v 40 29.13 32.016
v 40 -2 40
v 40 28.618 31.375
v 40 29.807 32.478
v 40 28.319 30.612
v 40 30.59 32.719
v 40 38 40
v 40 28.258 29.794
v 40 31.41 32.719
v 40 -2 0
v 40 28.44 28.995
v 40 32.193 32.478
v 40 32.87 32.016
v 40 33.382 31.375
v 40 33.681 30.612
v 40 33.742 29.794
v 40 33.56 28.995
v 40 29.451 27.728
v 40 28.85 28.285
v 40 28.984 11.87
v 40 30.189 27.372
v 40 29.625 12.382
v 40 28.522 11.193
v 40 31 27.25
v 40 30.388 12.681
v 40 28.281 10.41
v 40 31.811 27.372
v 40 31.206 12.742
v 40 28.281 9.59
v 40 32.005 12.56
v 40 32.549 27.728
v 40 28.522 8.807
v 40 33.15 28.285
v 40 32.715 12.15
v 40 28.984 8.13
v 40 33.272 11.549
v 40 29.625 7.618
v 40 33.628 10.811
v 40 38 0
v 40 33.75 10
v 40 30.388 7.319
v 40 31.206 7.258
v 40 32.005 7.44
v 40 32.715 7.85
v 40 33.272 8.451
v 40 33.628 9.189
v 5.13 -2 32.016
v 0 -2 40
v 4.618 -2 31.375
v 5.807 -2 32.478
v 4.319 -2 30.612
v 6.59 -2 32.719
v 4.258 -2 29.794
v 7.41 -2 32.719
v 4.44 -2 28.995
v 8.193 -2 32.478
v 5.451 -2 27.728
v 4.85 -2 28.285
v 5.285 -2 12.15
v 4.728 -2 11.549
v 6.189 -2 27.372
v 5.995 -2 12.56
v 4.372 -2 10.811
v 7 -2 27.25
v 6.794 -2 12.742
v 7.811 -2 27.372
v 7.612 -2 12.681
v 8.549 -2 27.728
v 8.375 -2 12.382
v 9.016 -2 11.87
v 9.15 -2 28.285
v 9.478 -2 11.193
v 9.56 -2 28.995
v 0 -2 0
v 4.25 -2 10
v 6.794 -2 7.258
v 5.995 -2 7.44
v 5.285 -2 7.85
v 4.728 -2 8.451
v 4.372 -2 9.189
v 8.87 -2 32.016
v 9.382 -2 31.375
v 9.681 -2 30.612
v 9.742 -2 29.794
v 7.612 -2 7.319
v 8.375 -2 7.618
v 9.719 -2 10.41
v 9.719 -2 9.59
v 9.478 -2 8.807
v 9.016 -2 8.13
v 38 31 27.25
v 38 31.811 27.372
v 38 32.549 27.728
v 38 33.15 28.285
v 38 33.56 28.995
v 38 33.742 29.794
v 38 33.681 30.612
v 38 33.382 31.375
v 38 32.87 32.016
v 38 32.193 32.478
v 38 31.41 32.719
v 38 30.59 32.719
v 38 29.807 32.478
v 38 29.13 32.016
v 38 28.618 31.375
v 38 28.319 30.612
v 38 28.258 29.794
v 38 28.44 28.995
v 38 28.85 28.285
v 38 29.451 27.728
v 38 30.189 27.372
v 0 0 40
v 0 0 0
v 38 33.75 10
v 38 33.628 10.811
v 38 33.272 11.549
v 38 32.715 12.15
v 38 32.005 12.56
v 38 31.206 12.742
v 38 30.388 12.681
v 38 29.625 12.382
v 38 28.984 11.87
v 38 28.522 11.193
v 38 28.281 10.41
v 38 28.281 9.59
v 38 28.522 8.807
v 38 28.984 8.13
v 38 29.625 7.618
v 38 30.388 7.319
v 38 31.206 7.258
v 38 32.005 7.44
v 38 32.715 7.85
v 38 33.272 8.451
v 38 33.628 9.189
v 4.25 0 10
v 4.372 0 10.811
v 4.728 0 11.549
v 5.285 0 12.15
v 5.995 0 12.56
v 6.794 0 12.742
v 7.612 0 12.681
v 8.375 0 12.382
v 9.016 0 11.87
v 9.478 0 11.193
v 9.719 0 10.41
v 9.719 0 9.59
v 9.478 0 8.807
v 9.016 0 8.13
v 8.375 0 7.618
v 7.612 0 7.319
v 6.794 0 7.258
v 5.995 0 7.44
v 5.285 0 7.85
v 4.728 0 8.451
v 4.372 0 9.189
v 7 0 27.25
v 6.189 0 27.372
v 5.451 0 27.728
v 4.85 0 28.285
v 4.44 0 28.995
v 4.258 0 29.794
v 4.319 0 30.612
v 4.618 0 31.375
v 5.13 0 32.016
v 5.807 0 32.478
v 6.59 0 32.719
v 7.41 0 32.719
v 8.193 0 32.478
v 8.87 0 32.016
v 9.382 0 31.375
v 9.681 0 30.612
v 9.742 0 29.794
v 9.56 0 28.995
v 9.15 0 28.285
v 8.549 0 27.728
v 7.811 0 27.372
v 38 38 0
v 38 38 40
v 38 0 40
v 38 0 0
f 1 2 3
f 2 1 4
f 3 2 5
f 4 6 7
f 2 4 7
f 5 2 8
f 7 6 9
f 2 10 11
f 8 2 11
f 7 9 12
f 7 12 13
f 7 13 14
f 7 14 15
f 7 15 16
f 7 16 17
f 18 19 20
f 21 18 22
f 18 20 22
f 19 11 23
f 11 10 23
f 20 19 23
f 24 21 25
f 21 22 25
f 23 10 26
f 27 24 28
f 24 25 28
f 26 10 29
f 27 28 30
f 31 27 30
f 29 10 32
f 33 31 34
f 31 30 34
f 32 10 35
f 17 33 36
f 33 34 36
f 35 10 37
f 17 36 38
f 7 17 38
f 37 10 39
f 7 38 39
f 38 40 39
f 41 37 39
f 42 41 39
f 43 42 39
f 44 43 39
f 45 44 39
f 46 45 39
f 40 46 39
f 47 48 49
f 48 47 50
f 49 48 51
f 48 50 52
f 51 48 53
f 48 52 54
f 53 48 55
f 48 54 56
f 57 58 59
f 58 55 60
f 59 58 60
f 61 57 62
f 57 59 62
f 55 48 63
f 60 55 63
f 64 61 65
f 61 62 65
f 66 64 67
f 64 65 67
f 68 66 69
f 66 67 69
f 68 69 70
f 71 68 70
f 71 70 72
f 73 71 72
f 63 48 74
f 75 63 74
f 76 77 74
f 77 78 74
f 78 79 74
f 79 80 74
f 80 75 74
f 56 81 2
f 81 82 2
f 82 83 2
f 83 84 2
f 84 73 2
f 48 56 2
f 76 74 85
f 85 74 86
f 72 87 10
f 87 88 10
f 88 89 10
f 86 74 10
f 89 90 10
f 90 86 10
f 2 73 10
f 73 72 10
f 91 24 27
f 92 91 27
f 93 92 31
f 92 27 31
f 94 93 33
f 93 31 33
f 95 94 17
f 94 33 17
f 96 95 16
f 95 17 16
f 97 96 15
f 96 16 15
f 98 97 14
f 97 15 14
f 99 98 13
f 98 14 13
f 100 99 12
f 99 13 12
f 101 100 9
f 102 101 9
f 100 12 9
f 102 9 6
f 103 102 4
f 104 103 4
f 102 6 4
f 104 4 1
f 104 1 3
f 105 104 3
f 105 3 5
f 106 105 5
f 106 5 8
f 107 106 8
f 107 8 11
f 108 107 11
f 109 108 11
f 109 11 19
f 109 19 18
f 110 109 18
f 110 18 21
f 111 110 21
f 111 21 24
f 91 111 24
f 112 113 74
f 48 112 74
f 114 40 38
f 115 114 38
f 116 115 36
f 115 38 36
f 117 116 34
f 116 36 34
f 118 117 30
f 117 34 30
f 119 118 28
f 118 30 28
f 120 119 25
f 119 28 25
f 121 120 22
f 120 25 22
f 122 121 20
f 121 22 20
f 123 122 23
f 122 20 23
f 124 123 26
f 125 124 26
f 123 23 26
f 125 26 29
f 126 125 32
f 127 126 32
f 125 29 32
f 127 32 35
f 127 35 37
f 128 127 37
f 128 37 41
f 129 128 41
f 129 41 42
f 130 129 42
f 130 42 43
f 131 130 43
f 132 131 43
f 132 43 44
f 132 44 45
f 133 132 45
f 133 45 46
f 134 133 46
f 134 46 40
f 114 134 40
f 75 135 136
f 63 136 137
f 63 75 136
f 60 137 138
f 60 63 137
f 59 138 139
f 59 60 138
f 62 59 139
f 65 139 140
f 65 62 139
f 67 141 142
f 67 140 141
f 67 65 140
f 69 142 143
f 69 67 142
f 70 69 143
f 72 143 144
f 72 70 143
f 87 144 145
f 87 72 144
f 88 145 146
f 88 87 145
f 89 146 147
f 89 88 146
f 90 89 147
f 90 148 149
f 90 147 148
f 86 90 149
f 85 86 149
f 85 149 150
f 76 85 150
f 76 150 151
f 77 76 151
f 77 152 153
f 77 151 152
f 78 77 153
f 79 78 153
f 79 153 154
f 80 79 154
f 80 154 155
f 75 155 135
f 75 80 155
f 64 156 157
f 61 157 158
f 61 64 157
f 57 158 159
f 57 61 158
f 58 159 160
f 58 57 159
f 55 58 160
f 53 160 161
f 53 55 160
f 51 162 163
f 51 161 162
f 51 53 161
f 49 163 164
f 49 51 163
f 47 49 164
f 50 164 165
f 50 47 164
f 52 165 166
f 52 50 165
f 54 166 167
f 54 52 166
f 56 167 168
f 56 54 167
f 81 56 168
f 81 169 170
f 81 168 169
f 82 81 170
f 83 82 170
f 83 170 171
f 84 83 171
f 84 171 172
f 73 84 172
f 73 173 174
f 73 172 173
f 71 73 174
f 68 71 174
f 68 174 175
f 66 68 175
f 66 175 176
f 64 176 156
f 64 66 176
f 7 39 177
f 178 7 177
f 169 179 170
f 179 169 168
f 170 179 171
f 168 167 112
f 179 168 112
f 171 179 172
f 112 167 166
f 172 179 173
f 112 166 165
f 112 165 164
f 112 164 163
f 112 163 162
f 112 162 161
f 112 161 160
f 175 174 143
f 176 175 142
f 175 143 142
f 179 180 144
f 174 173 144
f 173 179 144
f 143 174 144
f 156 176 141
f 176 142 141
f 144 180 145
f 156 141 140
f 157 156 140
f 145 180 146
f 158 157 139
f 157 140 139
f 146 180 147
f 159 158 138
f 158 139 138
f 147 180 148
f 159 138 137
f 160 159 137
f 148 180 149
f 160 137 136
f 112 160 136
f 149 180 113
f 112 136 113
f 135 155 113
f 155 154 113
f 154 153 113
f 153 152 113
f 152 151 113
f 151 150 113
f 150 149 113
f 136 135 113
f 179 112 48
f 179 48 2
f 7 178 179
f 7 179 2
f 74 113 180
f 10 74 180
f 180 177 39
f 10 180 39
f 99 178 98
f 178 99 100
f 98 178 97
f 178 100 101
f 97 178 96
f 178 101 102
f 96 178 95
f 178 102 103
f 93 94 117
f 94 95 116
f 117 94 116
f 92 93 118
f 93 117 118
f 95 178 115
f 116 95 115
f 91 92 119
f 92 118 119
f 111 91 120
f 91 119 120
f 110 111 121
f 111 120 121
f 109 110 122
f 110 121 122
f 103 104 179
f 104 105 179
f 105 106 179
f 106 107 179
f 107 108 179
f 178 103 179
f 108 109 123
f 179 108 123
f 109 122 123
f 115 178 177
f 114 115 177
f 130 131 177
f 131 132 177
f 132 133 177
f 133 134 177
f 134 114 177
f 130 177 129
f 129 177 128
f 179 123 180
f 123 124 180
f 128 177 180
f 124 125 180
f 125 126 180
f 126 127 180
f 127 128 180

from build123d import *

# Parameters (mm, degrees)
EXTRUDE_1_DEPTH     = 40
SKETCH_2_R          = 2.75
CUT_EXTRUDE_1_DEPTH = 40


with BuildPart() as part:
    # 草图1 → 凸台-拉伸1 (new body)
    with BuildSketch(Plane.XY):
        Polygon((0, 0), (0, -2), (40, -2), (40, 38), (38, 38), (38, 0), align=None)
    extrude(amount=EXTRUDE_1_DEPTH)

    # 草图2 → 切除-拉伸1 (cut)
    with BuildSketch(Plane(origin=(40, 0, 0), x_dir=(0, 0, -1), z_dir=(1, 0, 0))):
        with Locations((-30, 31)):
            Circle(SKETCH_2_R)
        with Locations(Location((-10, 31, 0), (0, 0, 90))):
            Circle(SKETCH_2_R)
    cut_extrude_1 = extrude(amount=-CUT_EXTRUDE_1_DEPTH, mode=Mode.SUBTRACT)

    # 镜向1: 切除-拉伸1 across plane
    add(cut_extrude_1.mirror(Plane(origin=(19, 19, 0), x_dir=(0, 0, 1), z_dir=(0.7071067811865488, 0.7071067811865464, 0))), mode=Mode.SUBTRACT)


solid = part.part
